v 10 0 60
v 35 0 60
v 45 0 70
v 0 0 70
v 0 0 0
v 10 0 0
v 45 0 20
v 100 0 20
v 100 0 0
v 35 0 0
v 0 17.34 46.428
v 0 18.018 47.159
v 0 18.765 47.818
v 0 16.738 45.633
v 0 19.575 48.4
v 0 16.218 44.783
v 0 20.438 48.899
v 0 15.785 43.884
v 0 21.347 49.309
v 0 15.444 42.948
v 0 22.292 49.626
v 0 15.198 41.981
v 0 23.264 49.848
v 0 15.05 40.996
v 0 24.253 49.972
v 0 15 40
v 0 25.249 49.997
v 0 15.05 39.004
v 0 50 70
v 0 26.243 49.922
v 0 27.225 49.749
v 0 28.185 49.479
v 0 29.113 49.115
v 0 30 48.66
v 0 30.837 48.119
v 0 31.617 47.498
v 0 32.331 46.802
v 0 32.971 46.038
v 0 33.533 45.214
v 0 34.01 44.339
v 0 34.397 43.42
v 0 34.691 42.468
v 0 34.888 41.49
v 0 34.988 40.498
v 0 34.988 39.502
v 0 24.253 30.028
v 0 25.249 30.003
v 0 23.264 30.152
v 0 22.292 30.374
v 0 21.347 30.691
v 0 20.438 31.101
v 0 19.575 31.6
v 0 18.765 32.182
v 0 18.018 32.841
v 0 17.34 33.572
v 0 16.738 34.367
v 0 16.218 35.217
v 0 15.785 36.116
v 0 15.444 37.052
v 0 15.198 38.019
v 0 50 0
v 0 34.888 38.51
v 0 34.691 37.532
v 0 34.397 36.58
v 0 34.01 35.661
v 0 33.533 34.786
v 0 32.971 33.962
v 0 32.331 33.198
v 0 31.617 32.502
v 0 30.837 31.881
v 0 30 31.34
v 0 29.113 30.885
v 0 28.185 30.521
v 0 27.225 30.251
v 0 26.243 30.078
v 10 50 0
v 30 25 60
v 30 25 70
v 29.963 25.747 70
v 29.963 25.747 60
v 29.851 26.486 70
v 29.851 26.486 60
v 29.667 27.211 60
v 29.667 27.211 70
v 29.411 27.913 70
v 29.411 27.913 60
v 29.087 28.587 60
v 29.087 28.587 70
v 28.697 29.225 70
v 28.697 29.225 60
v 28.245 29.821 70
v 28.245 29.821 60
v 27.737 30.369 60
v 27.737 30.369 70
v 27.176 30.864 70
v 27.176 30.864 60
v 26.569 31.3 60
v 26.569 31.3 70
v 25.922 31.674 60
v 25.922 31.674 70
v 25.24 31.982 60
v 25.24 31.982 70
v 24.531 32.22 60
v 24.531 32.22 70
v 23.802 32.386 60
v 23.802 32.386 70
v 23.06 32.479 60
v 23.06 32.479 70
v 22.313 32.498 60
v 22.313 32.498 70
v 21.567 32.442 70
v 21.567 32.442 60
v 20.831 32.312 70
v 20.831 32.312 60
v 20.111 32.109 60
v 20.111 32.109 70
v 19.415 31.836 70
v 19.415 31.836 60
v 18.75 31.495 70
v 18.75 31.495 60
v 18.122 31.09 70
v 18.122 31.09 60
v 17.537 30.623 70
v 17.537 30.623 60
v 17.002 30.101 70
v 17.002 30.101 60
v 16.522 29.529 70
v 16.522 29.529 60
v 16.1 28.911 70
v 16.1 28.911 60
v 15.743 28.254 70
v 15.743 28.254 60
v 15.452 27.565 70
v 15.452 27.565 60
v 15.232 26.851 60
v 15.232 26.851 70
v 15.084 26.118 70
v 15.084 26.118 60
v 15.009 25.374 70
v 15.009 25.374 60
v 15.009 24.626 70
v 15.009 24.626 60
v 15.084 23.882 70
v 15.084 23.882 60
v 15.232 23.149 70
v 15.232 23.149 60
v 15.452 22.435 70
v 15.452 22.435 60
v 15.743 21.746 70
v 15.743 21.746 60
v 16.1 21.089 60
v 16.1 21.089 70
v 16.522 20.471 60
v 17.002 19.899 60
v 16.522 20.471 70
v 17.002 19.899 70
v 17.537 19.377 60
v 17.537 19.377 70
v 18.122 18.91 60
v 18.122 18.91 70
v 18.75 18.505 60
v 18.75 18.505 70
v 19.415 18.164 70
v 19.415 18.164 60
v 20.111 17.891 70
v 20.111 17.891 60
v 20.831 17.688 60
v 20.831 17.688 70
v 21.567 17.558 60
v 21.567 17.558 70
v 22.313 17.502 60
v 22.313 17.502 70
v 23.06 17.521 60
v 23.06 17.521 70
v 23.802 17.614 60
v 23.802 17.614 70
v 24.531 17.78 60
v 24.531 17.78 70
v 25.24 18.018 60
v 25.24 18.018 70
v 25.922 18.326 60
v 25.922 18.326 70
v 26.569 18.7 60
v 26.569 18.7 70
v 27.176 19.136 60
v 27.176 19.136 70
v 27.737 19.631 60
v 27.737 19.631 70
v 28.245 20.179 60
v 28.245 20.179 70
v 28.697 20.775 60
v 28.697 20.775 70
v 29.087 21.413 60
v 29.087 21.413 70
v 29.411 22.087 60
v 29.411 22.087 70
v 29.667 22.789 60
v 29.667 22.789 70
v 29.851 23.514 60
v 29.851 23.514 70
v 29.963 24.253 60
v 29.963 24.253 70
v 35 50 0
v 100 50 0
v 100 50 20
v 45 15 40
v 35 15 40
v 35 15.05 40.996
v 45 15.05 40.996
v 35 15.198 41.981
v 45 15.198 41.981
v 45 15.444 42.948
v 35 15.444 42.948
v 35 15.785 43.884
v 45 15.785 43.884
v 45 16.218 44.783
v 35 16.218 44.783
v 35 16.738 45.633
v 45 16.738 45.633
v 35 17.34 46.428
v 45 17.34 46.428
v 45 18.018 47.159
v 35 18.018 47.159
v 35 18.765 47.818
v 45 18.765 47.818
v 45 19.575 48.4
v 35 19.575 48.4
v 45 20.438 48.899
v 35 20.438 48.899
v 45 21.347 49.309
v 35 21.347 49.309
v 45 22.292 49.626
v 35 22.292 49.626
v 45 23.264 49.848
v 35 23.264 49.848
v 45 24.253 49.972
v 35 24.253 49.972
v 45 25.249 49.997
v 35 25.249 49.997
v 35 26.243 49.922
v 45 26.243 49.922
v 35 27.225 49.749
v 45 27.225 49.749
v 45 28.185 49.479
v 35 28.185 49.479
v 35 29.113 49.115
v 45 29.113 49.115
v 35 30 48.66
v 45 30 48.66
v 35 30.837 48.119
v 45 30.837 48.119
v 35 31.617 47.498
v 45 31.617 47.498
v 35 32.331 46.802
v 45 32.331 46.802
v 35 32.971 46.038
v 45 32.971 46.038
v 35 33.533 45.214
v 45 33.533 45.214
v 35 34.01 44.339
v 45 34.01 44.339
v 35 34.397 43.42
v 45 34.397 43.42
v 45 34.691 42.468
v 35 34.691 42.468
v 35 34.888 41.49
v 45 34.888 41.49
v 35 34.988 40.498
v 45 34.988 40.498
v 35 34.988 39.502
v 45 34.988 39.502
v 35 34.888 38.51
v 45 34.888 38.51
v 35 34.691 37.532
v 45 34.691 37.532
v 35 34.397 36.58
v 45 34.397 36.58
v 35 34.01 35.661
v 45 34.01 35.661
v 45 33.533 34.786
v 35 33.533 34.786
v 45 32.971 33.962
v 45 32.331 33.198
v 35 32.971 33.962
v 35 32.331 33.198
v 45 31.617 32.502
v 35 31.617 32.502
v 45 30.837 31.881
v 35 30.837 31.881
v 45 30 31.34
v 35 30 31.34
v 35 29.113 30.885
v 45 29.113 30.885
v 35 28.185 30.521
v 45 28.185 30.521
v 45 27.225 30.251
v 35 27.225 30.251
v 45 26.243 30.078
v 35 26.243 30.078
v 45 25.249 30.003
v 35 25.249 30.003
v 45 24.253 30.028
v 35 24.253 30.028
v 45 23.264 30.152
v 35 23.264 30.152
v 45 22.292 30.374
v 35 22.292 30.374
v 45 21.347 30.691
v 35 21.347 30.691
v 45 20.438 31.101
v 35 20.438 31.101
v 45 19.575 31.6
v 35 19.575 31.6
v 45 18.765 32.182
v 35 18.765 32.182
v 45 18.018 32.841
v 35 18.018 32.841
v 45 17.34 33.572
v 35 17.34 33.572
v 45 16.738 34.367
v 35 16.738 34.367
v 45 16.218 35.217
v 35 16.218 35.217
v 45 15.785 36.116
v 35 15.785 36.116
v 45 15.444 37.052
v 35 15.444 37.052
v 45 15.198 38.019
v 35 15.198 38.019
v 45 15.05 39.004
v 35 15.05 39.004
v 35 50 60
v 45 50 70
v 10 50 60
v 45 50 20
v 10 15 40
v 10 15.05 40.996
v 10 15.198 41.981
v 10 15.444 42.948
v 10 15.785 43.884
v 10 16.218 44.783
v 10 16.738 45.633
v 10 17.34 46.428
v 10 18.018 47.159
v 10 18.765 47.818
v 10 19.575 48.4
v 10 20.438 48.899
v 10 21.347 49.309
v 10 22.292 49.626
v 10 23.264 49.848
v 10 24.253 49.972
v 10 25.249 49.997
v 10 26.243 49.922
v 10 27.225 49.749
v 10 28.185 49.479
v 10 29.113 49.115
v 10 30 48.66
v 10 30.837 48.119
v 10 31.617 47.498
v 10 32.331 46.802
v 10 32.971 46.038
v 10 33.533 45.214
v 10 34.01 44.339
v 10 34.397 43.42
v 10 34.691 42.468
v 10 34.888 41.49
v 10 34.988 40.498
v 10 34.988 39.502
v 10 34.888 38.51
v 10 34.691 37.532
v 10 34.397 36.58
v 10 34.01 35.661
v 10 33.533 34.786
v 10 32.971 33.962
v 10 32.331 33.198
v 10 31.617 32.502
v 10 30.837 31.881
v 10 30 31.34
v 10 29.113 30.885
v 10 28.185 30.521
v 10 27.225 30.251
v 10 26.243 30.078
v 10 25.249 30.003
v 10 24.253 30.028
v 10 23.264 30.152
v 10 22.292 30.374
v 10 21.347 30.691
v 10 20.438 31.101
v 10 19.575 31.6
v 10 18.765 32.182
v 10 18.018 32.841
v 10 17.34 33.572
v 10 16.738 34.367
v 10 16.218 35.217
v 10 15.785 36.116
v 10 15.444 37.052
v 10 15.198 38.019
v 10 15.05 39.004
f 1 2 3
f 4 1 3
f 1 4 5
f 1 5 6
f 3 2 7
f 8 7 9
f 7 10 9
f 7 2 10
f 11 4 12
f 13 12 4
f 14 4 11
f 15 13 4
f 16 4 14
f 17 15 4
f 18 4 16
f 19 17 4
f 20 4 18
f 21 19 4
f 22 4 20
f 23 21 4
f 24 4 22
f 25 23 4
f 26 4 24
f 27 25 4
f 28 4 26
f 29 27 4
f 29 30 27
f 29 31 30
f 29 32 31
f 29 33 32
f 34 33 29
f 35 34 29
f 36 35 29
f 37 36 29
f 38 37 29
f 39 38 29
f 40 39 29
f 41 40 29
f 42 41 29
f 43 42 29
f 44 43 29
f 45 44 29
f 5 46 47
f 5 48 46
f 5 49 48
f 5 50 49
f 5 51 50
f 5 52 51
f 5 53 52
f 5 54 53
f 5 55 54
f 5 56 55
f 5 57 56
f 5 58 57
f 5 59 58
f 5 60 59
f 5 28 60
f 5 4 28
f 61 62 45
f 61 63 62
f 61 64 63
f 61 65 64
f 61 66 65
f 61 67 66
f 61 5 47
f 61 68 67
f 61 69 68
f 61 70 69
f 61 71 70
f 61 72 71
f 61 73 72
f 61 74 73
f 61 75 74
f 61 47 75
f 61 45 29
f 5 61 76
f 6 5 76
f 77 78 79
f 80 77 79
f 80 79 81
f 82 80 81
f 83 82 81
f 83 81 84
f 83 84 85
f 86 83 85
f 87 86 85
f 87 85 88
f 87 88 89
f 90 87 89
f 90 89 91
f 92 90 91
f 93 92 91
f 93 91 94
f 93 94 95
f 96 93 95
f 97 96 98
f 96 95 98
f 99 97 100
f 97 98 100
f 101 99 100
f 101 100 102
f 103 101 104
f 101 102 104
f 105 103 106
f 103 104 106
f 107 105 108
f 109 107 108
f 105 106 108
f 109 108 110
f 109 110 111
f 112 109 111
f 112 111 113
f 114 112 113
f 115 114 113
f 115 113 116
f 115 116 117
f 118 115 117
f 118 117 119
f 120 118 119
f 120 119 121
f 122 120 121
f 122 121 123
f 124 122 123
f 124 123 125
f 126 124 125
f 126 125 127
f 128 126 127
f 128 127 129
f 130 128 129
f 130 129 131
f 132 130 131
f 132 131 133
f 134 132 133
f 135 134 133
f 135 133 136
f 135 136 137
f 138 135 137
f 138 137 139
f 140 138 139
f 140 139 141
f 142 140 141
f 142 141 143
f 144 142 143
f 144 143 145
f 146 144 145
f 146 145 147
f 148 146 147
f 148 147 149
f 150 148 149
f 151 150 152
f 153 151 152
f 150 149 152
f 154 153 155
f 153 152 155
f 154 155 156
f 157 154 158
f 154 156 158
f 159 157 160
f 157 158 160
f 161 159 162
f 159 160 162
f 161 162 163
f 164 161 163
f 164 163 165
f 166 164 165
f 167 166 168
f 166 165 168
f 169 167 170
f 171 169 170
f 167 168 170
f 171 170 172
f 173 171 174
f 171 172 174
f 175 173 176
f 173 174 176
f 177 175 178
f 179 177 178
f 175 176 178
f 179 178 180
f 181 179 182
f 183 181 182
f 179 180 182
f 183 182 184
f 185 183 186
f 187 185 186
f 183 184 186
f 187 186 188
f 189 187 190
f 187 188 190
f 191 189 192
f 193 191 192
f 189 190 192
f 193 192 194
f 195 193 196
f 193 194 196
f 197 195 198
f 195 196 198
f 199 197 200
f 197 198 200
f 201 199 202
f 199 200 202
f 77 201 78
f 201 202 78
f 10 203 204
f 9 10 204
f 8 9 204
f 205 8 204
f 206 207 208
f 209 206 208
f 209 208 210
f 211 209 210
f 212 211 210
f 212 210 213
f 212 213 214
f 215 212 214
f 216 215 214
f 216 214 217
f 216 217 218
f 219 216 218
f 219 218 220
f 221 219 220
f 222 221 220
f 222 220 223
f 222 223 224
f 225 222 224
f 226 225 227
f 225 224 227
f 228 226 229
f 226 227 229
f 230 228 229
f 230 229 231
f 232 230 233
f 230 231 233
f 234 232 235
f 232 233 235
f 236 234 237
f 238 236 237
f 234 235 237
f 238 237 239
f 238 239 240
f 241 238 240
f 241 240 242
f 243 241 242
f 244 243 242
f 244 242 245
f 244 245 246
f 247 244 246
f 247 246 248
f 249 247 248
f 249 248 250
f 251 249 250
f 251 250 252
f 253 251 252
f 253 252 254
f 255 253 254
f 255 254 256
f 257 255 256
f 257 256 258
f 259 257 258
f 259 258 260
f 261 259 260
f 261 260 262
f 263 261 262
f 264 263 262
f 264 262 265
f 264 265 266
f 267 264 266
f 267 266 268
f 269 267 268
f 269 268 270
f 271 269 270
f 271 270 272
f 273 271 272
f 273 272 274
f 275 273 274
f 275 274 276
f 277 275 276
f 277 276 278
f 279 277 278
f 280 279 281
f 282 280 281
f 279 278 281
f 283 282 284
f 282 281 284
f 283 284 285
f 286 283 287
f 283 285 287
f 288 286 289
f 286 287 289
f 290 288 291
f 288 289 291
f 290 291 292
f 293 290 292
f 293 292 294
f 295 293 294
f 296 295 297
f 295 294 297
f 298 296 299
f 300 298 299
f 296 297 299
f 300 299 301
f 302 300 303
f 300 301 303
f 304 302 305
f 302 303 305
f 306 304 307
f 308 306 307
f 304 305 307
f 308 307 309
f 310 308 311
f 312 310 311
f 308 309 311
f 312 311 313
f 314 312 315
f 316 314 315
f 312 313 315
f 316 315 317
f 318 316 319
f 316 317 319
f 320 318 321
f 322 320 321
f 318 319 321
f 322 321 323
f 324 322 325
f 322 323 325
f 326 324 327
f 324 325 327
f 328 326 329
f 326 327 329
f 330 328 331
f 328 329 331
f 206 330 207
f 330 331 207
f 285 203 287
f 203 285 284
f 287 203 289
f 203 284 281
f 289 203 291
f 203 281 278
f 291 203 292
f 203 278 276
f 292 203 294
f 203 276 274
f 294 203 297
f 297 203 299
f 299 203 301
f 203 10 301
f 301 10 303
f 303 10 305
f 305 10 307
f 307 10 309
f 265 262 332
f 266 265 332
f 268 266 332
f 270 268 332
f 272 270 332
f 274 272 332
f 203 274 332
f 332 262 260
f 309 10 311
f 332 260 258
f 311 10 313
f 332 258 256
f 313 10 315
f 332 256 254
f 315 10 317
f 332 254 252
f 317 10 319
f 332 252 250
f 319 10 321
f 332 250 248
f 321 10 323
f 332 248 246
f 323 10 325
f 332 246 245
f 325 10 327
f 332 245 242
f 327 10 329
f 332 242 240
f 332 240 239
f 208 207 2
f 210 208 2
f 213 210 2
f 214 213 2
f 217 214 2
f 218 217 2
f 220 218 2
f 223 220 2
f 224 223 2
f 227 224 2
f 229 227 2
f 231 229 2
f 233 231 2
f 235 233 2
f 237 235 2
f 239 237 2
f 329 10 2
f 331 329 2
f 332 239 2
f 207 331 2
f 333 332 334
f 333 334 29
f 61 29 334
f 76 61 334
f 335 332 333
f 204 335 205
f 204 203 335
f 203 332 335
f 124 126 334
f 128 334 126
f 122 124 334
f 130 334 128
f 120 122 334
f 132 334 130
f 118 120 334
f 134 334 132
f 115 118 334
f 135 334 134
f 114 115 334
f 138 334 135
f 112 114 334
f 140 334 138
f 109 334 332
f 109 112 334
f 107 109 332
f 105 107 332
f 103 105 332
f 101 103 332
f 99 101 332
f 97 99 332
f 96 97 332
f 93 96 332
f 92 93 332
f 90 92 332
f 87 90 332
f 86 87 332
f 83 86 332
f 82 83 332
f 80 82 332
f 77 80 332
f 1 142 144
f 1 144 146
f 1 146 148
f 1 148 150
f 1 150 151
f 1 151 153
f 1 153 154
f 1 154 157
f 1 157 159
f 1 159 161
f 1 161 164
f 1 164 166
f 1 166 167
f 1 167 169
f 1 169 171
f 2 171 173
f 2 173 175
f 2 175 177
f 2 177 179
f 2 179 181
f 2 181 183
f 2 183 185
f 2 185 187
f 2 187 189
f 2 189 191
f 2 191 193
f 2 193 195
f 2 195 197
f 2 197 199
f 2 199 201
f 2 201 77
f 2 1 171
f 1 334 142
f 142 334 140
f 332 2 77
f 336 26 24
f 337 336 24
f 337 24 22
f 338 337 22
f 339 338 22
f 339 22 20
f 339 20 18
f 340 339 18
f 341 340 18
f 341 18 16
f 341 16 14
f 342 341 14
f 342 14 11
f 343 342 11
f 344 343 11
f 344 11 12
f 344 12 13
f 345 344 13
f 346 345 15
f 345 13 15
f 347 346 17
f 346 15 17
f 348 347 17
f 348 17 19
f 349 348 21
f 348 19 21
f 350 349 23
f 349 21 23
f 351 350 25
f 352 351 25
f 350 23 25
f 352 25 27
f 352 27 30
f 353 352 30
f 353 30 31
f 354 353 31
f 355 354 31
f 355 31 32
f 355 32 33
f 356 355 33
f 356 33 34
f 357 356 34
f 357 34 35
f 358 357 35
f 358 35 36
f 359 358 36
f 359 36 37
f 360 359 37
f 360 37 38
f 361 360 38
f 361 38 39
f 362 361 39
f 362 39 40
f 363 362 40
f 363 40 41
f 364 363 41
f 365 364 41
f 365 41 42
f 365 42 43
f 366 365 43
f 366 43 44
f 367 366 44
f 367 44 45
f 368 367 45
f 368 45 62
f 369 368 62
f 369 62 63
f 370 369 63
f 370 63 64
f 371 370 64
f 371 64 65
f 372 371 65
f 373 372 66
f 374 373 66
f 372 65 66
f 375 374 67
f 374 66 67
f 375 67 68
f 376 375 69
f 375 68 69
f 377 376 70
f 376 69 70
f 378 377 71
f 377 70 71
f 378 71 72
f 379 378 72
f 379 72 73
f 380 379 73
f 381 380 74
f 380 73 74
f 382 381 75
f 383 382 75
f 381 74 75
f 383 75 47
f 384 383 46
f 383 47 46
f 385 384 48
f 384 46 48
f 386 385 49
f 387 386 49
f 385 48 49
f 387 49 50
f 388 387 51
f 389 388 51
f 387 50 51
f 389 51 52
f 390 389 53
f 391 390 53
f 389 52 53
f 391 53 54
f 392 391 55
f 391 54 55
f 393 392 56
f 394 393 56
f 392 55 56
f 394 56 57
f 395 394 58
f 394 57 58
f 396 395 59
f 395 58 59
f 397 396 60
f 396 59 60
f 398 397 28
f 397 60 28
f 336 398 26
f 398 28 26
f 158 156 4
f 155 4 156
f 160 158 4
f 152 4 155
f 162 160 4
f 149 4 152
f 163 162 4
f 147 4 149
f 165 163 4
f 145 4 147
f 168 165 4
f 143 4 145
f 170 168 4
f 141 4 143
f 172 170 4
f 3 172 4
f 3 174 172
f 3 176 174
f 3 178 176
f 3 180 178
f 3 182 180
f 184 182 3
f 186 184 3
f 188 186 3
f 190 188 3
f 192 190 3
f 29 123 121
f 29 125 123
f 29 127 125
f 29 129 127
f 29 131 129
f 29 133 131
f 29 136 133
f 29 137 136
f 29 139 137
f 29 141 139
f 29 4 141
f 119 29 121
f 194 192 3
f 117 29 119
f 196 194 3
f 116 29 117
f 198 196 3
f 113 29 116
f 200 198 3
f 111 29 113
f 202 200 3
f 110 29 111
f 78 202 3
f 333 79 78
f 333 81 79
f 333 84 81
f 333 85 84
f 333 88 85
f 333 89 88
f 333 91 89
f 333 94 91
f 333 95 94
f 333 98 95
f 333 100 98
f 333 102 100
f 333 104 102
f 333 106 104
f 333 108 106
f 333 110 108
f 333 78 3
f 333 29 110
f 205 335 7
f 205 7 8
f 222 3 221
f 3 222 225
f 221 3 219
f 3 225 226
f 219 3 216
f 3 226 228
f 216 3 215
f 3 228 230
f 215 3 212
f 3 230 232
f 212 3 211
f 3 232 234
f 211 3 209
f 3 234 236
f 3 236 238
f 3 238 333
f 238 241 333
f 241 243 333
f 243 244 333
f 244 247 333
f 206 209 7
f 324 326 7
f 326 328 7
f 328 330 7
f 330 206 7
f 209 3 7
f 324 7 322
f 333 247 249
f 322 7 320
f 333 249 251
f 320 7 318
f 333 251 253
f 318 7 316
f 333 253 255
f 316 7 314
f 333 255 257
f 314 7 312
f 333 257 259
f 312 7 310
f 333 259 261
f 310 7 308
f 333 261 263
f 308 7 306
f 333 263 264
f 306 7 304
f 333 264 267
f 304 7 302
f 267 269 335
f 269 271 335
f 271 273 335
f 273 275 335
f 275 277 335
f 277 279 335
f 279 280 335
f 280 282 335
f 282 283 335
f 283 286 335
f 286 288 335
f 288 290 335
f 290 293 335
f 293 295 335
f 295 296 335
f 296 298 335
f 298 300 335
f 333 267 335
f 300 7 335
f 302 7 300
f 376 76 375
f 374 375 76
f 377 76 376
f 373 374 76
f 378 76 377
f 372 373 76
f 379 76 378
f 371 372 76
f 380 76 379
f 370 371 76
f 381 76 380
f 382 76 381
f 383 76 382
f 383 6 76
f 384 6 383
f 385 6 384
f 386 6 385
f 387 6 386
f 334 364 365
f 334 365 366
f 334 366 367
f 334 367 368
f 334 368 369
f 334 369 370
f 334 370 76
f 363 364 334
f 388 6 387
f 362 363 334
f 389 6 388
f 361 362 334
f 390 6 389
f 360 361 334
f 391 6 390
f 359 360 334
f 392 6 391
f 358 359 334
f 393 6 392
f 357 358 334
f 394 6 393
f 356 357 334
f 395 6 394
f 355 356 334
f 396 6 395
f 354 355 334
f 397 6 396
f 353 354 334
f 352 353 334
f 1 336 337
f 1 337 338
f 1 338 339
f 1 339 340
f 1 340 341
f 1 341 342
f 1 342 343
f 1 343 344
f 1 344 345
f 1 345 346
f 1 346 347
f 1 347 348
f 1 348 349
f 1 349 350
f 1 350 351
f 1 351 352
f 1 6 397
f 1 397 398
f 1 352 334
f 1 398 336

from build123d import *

# Parameters (mm, degrees)
F0_W      = 100
F0_H      = 50
F1_DEPTH  = 20
F2_W      = 45
F2_H      = 50
F3_DEPTH  = 50
F4_W      = 25
F4_H      = 60
F5_DEPTH  = 50.001
F6_R      = 10
F7_DEPTH  = 100.001
F8_R      = 7.5
F10_DEPTH = 70.001


# Not quite as in the source:
# - a feature of the source that left no trace in its solid (it failed there, or was rolled back) is left out


with BuildPart() as f1:
    # F0 (on Top) → F1 (new body)
    with BuildSketch(Plane.XY):
        with Locations((50, 25)):
            Rectangle(F0_W, F0_H)
    extrude(amount=F1_DEPTH)

    # F2 (on face) → F3 (join)
    with BuildSketch(Plane.XY.offset(20)):
        with Locations((22.5, 25)):
            Rectangle(F2_W, F2_H)
    extrude(amount=F3_DEPTH)

    # F4 (on face) → F5 (cut, through all)
    with BuildSketch(Plane.XZ):
        with Locations((22.5, 30)):
            Rectangle(F4_W, F4_H)
    extrude(amount=-F5_DEPTH, mode=Mode.SUBTRACT)

    # F6 (on face) → F7 (cut, through all)
    with BuildSketch(Plane(origin=(0, 0, 0), x_dir=(0, -1, 0), z_dir=(-1, 0, 0))):
        with Locations((-25, 40)):
            Circle(F6_R)
    extrude(amount=-F7_DEPTH, mode=Mode.SUBTRACT)

    # F8 (on face) → F10 (cut, through all)
    with BuildSketch(Plane.XY.offset(70)):
        with Locations((22.5, 25)):
            Circle(F8_R)
    extrude(amount=-F10_DEPTH, mode=Mode.SUBTRACT)


solid = f1.part
